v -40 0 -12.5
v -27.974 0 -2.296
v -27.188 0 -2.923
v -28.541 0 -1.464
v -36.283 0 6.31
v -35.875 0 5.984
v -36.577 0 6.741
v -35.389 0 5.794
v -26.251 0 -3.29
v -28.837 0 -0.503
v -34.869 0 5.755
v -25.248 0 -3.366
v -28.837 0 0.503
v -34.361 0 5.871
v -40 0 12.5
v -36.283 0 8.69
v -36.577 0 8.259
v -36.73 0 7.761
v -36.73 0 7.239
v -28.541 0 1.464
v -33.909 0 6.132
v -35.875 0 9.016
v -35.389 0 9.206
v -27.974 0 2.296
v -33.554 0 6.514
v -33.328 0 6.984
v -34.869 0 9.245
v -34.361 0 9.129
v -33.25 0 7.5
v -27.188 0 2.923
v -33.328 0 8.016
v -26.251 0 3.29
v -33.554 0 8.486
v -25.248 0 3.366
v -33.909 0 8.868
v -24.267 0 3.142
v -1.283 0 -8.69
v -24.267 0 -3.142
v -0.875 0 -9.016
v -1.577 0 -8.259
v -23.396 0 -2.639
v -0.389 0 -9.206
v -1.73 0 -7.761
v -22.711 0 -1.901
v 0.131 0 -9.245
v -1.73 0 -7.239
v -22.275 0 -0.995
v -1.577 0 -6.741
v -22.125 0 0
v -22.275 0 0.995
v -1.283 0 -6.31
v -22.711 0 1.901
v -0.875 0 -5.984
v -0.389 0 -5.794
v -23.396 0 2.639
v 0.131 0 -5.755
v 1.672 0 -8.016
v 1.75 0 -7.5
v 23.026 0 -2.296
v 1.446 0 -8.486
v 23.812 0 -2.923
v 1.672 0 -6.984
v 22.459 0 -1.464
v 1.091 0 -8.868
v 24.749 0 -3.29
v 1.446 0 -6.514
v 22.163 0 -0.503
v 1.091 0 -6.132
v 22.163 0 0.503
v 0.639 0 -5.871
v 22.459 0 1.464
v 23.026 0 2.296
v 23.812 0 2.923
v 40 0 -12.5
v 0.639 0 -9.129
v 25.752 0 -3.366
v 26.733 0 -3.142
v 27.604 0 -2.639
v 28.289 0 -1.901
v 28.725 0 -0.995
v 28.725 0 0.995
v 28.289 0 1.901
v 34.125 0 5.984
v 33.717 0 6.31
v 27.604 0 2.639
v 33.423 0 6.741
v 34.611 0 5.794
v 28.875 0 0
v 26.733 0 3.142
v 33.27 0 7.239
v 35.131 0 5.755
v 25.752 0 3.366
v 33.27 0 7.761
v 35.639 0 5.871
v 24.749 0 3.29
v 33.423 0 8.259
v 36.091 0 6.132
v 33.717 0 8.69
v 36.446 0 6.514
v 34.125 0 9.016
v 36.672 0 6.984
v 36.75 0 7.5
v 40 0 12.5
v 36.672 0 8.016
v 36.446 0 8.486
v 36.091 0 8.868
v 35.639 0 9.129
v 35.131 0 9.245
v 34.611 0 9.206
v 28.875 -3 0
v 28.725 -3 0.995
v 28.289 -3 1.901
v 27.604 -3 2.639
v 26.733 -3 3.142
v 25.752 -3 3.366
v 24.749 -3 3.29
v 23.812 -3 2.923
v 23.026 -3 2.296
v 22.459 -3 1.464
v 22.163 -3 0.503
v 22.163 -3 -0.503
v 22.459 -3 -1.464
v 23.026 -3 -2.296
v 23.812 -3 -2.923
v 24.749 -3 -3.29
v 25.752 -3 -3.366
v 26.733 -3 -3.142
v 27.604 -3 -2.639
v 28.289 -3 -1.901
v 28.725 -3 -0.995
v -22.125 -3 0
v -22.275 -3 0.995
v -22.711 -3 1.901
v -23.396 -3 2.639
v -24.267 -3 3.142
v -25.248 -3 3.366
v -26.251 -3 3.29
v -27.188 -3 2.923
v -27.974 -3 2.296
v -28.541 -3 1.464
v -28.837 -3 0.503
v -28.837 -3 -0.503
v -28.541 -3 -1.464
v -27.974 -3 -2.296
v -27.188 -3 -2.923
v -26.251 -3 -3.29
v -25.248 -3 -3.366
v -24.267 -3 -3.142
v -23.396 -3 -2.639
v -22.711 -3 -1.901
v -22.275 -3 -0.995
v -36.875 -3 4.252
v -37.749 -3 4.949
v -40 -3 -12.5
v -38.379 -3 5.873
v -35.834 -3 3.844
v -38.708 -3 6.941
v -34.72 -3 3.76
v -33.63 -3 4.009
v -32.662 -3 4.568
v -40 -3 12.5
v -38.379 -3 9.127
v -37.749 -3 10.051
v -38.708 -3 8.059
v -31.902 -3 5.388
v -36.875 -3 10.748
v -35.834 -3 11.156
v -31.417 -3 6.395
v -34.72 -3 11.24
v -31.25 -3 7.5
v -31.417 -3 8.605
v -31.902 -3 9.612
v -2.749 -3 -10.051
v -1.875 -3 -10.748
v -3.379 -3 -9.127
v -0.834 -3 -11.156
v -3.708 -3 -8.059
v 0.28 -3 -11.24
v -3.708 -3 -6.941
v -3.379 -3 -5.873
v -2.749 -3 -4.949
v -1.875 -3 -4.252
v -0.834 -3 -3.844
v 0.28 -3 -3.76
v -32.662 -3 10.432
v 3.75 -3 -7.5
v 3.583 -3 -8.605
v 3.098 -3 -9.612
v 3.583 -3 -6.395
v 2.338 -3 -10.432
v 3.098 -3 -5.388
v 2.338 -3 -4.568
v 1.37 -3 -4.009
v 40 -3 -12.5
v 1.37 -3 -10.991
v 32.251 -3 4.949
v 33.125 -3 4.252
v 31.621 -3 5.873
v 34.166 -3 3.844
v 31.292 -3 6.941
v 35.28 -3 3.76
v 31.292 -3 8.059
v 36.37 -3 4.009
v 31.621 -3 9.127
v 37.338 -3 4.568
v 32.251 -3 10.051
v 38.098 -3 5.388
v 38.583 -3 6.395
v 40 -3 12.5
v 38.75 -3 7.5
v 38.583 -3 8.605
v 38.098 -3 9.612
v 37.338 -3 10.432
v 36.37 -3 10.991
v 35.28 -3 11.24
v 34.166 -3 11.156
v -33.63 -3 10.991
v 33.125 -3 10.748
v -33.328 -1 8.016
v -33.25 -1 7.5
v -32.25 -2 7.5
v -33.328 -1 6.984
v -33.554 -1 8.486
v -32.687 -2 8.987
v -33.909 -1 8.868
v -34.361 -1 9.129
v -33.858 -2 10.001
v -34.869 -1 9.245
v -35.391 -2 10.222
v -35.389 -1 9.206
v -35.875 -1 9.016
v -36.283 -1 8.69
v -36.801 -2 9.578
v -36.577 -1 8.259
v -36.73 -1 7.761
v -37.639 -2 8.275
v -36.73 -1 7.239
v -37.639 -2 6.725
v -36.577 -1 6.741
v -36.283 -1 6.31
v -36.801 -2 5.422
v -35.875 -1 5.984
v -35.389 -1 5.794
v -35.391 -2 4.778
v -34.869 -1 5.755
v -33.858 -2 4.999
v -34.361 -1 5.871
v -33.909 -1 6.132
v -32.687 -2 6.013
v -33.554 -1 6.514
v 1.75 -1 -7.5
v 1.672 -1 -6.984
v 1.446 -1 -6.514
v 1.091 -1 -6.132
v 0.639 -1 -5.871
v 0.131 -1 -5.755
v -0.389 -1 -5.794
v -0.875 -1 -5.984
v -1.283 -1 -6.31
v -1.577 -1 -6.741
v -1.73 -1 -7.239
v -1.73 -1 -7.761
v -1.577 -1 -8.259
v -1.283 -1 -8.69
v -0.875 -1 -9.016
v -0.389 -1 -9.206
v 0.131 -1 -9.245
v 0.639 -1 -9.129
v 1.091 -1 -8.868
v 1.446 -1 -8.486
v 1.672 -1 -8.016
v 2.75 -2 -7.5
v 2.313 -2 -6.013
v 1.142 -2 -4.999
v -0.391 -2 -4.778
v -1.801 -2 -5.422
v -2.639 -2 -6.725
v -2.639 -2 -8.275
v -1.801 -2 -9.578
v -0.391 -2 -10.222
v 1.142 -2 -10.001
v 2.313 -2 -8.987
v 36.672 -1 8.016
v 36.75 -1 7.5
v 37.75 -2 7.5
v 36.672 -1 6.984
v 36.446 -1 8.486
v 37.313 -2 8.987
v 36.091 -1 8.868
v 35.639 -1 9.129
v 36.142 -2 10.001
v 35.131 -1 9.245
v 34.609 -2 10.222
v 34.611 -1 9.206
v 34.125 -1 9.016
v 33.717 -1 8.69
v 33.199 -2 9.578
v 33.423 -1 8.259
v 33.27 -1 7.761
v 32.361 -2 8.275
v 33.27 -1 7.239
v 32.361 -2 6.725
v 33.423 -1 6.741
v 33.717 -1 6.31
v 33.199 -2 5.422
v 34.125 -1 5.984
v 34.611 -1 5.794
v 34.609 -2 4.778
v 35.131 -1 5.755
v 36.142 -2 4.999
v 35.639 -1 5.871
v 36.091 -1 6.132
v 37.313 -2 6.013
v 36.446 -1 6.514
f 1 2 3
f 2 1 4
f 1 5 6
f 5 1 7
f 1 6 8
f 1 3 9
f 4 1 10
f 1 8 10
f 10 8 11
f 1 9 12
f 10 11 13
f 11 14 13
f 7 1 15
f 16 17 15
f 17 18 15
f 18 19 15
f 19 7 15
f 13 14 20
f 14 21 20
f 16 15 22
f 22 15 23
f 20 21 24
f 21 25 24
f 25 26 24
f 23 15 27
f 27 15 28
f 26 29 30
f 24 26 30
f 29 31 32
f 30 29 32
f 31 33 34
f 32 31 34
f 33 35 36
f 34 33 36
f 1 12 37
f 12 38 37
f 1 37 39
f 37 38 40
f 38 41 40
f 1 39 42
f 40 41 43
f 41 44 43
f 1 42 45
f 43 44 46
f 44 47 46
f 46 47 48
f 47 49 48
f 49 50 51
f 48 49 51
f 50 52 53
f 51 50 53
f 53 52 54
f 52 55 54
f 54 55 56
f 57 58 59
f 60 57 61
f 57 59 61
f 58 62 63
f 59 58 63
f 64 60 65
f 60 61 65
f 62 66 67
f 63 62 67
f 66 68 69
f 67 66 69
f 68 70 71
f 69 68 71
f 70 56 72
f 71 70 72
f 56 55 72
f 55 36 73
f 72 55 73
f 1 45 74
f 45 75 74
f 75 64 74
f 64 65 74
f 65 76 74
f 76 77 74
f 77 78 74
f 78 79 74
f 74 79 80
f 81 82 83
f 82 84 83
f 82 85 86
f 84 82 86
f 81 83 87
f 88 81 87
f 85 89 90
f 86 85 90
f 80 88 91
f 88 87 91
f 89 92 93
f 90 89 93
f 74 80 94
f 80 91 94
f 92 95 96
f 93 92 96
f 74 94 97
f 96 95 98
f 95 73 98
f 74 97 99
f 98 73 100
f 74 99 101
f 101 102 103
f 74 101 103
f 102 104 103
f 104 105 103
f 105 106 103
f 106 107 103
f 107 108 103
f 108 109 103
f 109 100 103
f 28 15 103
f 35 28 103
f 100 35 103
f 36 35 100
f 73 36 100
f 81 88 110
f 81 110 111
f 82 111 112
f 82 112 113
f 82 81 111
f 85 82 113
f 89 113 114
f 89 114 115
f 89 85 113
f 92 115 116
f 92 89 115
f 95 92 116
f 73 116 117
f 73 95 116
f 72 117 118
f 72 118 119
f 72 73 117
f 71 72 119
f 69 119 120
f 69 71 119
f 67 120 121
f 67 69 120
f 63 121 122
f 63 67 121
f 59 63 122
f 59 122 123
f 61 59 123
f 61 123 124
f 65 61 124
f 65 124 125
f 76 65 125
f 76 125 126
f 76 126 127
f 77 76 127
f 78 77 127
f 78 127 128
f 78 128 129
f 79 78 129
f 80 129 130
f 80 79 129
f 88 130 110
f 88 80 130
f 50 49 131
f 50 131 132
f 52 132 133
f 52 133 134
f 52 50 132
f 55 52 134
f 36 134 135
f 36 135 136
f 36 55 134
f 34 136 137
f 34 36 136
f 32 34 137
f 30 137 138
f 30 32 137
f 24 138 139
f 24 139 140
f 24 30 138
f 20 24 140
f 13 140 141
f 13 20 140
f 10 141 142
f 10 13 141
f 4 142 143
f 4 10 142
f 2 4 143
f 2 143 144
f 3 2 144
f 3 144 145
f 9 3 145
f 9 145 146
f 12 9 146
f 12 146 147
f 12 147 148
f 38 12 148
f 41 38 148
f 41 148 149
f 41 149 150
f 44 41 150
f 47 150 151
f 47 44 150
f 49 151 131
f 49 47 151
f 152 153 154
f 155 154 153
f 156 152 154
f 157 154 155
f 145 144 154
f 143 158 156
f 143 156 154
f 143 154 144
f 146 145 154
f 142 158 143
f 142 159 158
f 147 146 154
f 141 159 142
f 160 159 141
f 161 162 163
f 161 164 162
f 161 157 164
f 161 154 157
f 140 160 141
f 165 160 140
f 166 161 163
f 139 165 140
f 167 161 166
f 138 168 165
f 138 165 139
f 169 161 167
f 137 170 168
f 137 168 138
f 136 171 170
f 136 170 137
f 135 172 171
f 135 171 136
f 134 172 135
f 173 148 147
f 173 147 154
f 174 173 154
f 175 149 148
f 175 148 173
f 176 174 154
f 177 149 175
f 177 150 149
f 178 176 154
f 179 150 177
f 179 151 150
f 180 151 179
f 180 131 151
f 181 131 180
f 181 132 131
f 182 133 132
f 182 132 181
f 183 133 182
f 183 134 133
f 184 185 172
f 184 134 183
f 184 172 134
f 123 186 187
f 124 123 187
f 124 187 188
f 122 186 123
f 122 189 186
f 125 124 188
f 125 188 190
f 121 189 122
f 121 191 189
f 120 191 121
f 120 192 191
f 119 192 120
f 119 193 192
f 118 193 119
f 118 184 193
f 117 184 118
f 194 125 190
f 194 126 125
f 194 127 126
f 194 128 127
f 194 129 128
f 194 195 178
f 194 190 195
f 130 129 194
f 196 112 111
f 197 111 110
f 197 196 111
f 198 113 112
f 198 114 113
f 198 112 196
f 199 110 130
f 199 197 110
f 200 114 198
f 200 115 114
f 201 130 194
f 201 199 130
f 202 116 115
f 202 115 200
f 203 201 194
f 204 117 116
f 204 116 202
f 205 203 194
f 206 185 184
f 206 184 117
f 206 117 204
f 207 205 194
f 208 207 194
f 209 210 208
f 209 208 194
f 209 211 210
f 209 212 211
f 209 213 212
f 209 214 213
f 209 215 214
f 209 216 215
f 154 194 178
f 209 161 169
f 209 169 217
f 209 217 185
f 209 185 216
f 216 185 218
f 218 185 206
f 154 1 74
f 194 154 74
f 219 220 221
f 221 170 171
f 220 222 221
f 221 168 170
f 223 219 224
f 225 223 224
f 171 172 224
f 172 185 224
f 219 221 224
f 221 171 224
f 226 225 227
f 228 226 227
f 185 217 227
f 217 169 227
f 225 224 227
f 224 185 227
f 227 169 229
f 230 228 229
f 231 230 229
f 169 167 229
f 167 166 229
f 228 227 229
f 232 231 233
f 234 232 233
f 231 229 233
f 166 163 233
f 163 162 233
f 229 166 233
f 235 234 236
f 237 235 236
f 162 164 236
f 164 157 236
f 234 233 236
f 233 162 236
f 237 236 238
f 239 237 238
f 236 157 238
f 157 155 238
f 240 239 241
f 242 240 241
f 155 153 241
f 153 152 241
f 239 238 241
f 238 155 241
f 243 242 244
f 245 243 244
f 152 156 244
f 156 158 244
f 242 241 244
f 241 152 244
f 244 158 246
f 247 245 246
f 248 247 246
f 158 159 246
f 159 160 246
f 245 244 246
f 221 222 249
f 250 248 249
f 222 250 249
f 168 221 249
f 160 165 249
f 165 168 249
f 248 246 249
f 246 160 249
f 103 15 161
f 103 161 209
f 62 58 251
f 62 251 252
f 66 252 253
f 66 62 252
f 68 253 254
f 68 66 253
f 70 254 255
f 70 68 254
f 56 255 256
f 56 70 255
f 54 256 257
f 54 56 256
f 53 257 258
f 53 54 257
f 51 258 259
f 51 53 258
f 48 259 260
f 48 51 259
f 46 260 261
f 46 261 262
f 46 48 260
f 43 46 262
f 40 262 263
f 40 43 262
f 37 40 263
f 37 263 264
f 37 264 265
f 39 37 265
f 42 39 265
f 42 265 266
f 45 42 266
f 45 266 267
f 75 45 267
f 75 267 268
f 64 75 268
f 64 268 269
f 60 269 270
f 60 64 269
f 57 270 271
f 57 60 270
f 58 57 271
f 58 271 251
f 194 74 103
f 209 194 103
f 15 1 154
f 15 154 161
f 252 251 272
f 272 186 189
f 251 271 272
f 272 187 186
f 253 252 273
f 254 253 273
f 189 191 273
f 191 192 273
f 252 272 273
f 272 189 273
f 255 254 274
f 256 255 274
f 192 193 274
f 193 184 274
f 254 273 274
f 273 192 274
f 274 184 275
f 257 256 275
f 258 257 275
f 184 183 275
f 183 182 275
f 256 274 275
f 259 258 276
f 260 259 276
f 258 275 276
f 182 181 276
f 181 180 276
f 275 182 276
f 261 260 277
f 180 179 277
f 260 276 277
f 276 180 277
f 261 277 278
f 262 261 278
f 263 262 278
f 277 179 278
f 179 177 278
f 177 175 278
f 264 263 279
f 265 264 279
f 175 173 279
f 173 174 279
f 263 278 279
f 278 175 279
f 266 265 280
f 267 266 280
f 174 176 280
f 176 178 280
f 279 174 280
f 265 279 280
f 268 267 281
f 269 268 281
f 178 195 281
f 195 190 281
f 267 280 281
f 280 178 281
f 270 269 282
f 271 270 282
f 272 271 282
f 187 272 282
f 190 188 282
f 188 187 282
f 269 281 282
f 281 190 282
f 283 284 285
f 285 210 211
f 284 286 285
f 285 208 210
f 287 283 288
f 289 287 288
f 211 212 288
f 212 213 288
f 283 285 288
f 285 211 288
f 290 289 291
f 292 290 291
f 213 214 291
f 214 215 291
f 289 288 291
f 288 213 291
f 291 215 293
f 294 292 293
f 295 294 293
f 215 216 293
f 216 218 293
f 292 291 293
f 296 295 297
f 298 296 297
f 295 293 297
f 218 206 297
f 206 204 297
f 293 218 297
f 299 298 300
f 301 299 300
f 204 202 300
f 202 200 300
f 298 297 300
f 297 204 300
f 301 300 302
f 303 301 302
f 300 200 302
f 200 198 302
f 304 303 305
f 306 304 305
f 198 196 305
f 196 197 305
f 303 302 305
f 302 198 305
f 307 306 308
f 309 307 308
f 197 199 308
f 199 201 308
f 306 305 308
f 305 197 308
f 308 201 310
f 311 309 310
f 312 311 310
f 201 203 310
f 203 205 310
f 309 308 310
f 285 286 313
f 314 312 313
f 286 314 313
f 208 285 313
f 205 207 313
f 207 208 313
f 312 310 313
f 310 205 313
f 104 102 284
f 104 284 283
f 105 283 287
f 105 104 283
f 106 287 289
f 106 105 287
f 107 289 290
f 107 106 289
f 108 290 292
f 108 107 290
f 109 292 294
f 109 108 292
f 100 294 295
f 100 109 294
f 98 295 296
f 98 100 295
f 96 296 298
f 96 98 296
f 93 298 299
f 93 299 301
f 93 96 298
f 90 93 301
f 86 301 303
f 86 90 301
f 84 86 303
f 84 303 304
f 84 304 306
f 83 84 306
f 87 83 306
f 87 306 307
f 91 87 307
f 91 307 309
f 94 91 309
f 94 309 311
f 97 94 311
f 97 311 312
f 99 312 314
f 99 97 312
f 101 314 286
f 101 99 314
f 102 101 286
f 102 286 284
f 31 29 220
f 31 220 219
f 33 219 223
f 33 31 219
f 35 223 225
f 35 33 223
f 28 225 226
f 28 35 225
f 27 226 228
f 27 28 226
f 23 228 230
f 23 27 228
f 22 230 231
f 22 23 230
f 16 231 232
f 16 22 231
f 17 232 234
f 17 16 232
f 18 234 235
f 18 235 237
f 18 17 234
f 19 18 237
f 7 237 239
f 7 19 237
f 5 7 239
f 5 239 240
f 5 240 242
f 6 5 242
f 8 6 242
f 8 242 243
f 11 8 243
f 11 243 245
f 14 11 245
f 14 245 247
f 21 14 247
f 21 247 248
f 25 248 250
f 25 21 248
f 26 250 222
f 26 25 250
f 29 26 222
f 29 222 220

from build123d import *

# Parameters (mm, degrees)
F0_W     = 80
F0_H     = 25
F0_R     = 1.75
F0_R_2   = 3.375
F1_DEPTH = 3
F2_SIZE  = 2


with BuildPart() as f1:
    # F0 (on Front) → F1 (new body)
    with BuildSketch(Plane.XZ):
        Rectangle(F0_W, F0_H)
        with Locations((0, -7.5)):
            Circle(F0_R, mode=Mode.SUBTRACT)
        with Locations((-25.5, 0)):
            Circle(F0_R_2, mode=Mode.SUBTRACT)
        with Locations((-35, 7.5)):
            Circle(F0_R, mode=Mode.SUBTRACT)
        with Locations((25.5, 0)):
            Circle(F0_R_2, mode=Mode.SUBTRACT)
        with Locations((35, 7.5)):
            Circle(F0_R, mode=Mode.SUBTRACT)
    extrude(amount=F1_DEPTH)

    # F2
    f2_edges = [f1.edges().sort_by_distance(p)[0] for p in [
        (-36.75, -3, 7.5),
        (-1.75, -3, -7.5),
        (33.25, -3, 7.5),
    ]]
    chamfer(f2_edges, length=F2_SIZE)


solid = f1.part
